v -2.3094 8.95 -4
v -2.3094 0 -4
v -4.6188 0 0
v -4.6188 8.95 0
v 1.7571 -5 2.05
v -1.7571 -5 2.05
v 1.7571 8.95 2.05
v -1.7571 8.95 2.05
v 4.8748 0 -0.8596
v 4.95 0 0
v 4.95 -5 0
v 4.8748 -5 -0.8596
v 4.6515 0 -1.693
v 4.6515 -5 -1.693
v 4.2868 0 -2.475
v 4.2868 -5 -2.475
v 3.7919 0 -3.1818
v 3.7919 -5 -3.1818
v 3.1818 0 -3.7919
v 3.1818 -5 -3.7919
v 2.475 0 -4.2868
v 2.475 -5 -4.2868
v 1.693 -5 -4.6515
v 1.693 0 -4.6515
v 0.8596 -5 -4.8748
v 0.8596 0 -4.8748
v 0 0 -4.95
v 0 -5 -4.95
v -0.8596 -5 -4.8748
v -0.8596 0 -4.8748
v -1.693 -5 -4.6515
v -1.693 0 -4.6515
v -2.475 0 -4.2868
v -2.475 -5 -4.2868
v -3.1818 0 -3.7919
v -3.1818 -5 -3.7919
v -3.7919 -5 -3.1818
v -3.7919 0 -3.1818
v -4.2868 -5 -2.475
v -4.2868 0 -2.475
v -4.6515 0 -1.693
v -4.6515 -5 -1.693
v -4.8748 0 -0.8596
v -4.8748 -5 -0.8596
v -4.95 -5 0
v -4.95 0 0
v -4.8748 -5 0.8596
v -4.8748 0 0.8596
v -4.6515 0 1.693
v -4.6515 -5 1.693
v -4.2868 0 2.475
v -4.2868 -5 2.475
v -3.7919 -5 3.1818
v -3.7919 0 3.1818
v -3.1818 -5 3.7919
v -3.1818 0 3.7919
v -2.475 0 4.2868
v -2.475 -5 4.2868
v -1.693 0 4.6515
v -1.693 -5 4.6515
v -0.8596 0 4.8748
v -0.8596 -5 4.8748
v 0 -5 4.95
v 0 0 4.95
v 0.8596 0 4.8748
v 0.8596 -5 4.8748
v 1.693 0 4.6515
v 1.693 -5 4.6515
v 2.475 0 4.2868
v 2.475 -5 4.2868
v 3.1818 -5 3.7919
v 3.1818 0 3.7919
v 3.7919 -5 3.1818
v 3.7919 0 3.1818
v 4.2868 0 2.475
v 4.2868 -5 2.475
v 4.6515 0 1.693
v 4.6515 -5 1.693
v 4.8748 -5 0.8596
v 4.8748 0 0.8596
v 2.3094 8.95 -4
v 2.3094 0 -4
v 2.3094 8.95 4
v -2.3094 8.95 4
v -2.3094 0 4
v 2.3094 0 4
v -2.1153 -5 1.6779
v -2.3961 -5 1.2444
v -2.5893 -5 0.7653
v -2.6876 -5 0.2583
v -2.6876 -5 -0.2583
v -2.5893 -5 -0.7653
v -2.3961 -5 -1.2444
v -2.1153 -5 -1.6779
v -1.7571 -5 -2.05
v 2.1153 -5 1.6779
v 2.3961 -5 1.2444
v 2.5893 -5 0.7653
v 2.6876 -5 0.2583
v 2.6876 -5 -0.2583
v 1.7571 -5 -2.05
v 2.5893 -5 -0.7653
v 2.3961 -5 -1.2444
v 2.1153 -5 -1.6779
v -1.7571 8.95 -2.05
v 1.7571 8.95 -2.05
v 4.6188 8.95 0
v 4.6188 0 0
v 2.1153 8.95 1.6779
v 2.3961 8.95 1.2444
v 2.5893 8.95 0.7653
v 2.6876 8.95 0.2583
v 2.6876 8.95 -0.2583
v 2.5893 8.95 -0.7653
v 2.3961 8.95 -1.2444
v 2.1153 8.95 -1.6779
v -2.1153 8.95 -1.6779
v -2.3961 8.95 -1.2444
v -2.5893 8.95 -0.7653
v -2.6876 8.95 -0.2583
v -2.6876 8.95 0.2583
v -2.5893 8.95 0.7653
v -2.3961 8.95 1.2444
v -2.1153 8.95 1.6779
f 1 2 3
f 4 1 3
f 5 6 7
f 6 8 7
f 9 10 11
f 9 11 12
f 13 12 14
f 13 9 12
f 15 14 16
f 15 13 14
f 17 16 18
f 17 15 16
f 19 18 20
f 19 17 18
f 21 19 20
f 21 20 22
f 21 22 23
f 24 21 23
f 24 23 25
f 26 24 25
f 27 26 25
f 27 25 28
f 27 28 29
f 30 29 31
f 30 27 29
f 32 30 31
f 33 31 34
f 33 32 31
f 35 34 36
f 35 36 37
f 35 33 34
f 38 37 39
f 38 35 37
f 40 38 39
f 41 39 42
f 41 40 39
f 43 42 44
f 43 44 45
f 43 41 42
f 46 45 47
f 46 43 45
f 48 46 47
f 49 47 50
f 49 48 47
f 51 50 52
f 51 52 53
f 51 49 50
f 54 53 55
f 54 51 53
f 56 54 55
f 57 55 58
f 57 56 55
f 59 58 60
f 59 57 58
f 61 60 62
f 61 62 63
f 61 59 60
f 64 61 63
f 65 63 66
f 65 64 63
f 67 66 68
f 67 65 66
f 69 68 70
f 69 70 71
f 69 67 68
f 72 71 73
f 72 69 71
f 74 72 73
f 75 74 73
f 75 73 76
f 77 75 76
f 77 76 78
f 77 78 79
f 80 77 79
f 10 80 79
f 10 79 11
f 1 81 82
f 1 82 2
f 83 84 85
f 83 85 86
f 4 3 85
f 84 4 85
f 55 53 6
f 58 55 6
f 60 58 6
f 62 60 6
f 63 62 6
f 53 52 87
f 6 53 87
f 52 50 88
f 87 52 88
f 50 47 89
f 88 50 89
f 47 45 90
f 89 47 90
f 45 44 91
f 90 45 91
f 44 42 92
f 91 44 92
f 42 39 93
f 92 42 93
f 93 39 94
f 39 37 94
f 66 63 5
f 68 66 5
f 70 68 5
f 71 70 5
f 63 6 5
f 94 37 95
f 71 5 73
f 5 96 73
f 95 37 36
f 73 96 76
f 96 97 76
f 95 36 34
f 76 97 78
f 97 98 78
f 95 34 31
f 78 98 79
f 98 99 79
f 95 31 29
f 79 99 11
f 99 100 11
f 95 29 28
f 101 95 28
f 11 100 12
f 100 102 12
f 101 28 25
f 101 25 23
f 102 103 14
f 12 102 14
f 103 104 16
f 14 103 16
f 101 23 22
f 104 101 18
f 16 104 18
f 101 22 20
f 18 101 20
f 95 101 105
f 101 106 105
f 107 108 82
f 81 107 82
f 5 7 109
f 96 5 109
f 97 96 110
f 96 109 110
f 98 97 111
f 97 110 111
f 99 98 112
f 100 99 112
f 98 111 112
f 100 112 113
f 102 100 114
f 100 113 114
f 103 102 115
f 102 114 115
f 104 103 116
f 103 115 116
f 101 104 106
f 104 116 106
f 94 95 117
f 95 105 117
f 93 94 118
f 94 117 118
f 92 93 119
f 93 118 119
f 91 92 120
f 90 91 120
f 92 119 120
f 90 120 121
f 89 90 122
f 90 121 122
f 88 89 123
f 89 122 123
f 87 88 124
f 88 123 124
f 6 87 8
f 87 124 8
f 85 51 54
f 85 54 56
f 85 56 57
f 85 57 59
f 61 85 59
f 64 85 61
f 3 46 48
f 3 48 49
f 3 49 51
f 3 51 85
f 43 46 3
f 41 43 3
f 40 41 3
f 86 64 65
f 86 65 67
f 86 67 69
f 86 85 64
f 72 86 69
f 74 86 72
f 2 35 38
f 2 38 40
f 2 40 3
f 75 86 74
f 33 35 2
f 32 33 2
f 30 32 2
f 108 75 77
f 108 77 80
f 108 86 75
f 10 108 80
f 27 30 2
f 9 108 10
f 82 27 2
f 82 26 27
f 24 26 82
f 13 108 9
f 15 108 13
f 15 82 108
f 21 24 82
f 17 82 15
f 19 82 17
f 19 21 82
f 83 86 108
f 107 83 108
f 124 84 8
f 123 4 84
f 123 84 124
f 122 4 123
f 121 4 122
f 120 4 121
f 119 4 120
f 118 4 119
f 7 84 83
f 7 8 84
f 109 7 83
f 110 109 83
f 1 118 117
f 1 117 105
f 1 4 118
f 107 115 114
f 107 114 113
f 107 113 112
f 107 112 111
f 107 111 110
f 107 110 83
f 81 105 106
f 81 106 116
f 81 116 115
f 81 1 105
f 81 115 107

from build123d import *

# Parameters (mm, degrees)
BOSS_EXTRUDE1_DEPTH = 8.95
BOSS_EXTRUDE2_START = -5
SKETCH1_3_R         = 4.95
BOSS_EXTRUDE2_DEPTH = 5


with BuildPart() as part:
    # Sketch1 → Boss-Extrude1 (new body)
    with BuildSketch(Plane(origin=(0, 0, 0), x_dir=(1, 0, 0), z_dir=(0, 1, 0))):
        Polygon((4.618802154, 0), (2.309401077, 4), (-2.309401077, 4), (-4.618802154, 0), (-2.309401077, -4), (2.309401077, -4), align=None)
        with BuildLine():
            ThreePointArc((-1.757128339, -2.05), (-2.7, 0), (-1.757128339, 2.05))
            Line((-1.757128339, 2.05), (1.757128339, 2.05))
            ThreePointArc((1.757128339, 2.05), (2.7, 0), (1.757128339, -2.05))
            Line((1.757128339, -2.05), (-1.757128339, -2.05))
        make_face(mode=Mode.SUBTRACT)
    extrude(amount=BOSS_EXTRUDE1_DEPTH)

    # Sketch1<3> → Boss-Extrude2 (add)
    with BuildSketch(Plane(origin=(0, 0, 0), x_dir=(1, 0, 0), z_dir=(0, 1, 0)).offset(BOSS_EXTRUDE2_START)):
        Circle(SKETCH1_3_R)
        with BuildLine():
            ThreePointArc((-1.757128339, -2.05), (-2.7, 0), (-1.757128339, 2.05))
            Line((-1.757128339, 2.05), (1.757128339, 2.05))
            ThreePointArc((1.757128339, 2.05), (2.7, 0), (1.757128339, -2.05))
            Line((1.757128339, -2.05), (-1.757128339, -2.05))
        make_face(mode=Mode.SUBTRACT)
    extrude(amount=BOSS_EXTRUDE2_DEPTH)


solid = part.part
